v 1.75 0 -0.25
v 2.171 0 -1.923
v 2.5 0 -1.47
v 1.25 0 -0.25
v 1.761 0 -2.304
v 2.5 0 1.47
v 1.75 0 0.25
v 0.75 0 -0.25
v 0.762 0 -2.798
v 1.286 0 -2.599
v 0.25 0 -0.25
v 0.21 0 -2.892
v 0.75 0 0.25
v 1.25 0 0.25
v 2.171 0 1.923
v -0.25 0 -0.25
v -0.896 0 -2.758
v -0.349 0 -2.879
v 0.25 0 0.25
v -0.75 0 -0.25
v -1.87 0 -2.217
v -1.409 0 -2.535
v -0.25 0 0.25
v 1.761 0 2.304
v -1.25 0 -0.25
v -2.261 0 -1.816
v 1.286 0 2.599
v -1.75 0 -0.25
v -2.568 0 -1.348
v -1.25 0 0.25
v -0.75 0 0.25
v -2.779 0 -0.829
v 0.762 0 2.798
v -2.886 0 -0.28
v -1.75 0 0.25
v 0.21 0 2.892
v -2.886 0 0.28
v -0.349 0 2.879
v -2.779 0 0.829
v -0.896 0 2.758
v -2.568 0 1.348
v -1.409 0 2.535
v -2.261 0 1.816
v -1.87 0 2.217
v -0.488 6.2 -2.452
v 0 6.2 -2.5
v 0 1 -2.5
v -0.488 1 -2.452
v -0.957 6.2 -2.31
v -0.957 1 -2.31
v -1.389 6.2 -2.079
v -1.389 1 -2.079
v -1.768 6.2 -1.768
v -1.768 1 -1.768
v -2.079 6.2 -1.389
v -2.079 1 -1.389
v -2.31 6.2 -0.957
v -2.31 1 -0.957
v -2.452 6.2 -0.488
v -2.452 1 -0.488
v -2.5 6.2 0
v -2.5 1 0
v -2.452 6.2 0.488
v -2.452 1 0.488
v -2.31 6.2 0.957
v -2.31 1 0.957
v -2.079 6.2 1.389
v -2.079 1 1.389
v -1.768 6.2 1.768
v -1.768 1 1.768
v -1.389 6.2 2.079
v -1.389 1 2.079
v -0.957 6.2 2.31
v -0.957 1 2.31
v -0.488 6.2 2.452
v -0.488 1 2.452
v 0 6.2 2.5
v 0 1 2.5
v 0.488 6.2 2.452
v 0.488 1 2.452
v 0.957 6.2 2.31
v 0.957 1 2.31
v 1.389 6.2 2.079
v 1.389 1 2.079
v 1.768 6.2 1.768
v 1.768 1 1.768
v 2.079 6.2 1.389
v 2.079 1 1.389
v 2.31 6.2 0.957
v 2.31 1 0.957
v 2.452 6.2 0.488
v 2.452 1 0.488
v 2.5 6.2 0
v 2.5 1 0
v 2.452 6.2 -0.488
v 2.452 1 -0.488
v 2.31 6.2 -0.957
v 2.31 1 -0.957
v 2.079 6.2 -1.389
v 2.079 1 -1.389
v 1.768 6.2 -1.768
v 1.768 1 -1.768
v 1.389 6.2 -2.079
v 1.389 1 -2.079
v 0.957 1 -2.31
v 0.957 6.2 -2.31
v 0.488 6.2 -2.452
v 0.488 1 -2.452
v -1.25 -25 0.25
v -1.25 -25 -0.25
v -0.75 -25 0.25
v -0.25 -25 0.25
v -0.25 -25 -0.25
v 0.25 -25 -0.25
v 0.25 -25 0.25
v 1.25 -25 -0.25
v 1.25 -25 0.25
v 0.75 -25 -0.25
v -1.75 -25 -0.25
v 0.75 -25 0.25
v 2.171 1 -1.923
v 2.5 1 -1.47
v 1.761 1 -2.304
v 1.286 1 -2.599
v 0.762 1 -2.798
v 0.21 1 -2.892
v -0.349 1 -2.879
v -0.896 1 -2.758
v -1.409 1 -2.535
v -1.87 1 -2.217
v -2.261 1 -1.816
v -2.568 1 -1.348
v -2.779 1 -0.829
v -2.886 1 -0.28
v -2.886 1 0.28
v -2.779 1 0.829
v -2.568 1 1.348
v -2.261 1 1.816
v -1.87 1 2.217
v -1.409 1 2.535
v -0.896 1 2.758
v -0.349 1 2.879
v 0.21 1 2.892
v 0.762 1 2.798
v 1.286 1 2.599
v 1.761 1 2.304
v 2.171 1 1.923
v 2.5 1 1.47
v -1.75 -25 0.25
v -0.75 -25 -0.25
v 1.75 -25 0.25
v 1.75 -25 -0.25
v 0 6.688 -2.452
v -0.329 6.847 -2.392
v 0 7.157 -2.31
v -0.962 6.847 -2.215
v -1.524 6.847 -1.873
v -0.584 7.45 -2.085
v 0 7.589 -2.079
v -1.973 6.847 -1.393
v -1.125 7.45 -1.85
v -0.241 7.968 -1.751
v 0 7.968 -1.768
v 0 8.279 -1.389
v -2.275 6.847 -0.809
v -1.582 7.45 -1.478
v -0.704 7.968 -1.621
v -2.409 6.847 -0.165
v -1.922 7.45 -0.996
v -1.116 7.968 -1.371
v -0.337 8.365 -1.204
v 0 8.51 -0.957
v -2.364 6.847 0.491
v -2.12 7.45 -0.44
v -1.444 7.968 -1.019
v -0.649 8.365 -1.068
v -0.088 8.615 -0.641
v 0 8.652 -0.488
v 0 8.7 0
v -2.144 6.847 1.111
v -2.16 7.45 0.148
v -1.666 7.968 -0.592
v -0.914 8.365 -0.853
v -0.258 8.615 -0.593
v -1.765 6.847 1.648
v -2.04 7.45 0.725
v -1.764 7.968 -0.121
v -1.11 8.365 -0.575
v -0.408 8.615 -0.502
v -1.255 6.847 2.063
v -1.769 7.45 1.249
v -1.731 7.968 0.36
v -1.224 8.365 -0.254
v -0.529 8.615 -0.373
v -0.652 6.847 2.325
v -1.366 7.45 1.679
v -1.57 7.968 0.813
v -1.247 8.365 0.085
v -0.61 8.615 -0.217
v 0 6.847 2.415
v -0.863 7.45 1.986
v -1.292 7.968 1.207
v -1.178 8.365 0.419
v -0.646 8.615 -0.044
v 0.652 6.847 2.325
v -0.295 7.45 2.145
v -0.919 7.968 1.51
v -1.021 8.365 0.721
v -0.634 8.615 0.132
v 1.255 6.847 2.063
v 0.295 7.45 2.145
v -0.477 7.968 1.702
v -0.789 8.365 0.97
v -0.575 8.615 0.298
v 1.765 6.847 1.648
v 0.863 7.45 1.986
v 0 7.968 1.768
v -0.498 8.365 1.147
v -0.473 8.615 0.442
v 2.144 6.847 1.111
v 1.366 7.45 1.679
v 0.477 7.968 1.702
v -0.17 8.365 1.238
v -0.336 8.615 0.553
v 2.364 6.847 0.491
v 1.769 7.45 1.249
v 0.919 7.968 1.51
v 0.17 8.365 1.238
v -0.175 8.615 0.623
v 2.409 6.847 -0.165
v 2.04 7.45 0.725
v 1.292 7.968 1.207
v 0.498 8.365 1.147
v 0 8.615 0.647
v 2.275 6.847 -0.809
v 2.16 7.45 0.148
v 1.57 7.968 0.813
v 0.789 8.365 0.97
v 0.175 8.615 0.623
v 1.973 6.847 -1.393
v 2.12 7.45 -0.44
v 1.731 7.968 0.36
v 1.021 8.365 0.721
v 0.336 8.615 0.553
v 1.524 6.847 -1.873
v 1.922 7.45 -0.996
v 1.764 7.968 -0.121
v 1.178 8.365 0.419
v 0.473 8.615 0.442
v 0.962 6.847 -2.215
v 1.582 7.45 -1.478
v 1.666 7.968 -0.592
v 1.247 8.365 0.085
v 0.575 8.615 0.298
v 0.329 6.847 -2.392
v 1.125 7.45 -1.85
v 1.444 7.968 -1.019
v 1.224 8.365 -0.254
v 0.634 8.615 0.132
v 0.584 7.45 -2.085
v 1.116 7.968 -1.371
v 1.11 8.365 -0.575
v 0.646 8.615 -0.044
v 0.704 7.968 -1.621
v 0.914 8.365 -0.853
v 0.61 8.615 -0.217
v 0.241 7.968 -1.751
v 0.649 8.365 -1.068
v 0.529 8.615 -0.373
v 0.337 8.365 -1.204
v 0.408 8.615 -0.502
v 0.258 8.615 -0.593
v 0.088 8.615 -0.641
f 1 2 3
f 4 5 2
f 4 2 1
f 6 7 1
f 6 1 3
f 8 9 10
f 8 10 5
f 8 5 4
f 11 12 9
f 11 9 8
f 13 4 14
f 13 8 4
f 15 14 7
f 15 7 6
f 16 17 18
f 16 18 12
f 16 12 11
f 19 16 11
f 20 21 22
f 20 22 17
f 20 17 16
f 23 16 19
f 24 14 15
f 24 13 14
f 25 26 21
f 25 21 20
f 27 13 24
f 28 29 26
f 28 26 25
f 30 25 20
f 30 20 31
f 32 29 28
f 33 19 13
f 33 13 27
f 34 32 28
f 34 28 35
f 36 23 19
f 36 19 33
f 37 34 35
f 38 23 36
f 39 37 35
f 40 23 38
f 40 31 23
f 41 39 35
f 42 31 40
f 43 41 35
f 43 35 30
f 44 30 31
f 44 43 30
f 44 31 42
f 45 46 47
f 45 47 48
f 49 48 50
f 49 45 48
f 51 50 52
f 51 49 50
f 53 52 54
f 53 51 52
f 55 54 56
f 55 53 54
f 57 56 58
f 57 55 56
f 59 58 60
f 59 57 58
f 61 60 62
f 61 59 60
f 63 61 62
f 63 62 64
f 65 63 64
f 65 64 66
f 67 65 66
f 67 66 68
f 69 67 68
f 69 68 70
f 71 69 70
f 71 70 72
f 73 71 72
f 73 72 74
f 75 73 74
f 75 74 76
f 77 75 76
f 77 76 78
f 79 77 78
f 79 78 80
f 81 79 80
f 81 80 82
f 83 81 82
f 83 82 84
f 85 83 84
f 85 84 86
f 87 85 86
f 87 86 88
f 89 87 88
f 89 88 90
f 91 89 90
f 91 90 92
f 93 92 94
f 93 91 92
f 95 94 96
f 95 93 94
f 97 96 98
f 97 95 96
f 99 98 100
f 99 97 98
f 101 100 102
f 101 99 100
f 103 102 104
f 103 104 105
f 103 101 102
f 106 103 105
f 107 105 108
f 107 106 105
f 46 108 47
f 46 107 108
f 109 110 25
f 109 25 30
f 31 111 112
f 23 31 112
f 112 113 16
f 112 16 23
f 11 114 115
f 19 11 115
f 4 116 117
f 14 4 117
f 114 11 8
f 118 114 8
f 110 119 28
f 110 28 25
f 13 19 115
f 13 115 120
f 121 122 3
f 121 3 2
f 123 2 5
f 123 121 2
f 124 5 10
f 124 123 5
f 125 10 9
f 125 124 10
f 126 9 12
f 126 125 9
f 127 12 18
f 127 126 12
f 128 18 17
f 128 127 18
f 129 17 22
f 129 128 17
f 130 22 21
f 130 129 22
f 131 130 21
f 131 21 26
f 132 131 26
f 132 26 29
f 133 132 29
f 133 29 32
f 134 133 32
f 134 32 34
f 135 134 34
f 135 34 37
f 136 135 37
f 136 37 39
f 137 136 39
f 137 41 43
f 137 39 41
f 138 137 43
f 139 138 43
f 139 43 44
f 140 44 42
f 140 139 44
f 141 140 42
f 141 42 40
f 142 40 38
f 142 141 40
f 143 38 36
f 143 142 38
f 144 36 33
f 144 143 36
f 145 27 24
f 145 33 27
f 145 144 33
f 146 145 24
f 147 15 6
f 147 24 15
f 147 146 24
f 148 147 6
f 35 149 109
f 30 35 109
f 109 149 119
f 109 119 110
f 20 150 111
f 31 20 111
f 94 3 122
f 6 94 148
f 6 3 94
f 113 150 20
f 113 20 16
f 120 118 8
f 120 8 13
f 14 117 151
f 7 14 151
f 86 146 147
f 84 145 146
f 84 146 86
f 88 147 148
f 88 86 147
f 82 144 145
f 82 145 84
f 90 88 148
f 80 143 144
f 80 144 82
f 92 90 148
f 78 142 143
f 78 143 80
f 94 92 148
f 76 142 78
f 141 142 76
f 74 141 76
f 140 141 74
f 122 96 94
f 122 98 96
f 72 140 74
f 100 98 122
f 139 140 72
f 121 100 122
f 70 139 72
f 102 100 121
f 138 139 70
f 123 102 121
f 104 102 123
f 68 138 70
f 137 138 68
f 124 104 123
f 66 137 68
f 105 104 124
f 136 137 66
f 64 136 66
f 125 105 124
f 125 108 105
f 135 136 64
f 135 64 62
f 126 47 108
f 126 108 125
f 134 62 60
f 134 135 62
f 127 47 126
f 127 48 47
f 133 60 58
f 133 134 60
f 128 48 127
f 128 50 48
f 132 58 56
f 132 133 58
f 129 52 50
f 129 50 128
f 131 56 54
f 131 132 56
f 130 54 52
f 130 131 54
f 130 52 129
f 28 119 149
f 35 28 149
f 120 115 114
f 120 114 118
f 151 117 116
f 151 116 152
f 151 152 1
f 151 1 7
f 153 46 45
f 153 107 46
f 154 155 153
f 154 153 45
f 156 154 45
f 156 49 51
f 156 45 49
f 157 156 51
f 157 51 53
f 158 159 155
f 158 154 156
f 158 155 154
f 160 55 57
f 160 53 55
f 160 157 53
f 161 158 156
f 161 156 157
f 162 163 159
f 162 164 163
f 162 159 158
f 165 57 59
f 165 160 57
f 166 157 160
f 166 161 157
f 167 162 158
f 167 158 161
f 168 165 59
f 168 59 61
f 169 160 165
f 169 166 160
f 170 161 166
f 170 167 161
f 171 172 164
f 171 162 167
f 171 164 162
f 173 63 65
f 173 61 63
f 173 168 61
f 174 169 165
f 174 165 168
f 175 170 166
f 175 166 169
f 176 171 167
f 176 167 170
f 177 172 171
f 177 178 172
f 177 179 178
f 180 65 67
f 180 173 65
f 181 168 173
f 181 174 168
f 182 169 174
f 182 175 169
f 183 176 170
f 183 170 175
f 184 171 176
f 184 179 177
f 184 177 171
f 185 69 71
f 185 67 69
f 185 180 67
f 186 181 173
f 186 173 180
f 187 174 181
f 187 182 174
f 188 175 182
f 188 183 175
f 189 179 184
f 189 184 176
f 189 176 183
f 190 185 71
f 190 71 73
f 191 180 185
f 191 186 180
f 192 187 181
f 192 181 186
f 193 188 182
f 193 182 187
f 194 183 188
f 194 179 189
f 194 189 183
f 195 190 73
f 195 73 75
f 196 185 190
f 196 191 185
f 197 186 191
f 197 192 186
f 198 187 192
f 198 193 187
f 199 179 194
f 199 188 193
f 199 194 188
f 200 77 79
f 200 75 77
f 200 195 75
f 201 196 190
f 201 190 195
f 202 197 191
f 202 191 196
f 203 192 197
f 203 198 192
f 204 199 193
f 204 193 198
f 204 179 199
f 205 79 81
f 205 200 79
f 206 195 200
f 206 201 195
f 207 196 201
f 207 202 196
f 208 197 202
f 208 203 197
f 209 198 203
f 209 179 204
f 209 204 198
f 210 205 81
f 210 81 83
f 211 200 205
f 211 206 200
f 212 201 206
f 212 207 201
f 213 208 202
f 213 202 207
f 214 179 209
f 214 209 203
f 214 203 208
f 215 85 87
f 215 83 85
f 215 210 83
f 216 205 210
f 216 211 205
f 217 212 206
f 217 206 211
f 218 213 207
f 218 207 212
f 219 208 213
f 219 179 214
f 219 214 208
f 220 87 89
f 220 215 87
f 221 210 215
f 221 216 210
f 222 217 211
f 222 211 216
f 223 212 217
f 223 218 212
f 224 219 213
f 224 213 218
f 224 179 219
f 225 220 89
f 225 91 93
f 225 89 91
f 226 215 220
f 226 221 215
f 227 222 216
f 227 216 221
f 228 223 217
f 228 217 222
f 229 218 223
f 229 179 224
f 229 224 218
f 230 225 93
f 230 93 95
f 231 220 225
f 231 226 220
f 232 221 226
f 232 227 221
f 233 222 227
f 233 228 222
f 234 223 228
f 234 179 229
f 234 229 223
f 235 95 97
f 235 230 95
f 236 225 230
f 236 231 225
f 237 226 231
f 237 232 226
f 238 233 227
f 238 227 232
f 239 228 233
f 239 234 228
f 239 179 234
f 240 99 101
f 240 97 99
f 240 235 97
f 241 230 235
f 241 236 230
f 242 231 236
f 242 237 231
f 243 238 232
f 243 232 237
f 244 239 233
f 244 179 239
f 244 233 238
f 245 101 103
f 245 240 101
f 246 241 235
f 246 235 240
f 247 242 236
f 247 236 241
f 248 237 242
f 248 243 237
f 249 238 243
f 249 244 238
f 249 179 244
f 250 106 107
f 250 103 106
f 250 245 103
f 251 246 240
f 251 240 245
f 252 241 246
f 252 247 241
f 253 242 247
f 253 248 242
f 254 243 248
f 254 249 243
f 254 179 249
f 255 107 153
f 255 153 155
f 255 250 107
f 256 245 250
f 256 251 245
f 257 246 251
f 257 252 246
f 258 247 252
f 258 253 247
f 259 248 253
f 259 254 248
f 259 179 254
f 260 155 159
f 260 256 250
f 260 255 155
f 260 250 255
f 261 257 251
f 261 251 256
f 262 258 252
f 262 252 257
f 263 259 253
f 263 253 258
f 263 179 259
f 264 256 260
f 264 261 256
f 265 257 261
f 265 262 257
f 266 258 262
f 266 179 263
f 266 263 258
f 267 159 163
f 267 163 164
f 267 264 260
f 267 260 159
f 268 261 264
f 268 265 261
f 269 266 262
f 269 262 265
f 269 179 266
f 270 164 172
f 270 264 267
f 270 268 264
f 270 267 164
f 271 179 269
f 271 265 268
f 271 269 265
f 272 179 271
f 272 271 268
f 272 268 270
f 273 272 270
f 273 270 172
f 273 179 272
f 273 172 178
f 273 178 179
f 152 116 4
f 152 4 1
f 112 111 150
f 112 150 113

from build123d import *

# Parameters (mm, degrees)
CUT_EXTRUDE1_DEPTH      = 10.618211892
CUT_EXTRUDE1_DEPTH_BACK = 10.618211892
SKETCH3_W               = 0.5
SKETCH3_H               = 0.500000016
BOSS_EXTRUDE2_DEPTH     = 25


with BuildPart() as part:
    # Sketch1 → Revolve1 (revolve)
    with BuildSketch(Plane.XY, mode=Mode.PRIVATE) as revolve1_sk:
        with BuildLine():
            Line((0, 0), (2.9, 0))
            Line((2.9, 0), (2.9, 1))
            Line((2.9, 1), (2.5, 1))
            Line((2.5, 1), (2.5, 6.2))
            ThreePointArc((2.5, 6.2), (1.767766953, 7.967766953), (0, 8.7))
            Line((0, 8.7), (0, 0))
        make_face()
    revolve(revolve1_sk.sketch.rotate(Axis((0, 0, 0), (0, 1, 0)), 90), axis=Axis((0, 0, 0), (0, 1, 0)))

    # Sketch2 → Cut-Extrude1 (cut, two sides: drawn at the far end of the back side and taken through both)
    with BuildSketch(Plane(origin=(0, 0, 0), x_dir=(1, 0, 0), z_dir=(0, 1, 0)).offset(-CUT_EXTRUDE1_DEPTH_BACK)):
        Polygon((2.5, 0), (2.5, 2.5), (3.317010746, 2.5), (3.317010746, -2.186016692), (2.5, -2.186016692), align=None)
    extrude(amount=CUT_EXTRUDE1_DEPTH + CUT_EXTRUDE1_DEPTH_BACK, mode=Mode.SUBTRACT)

    # Sketch3 → Boss-Extrude2 (add)
    with BuildSketch(Plane.XZ):
        with Locations((-1.5, 0)):
            Rectangle(SKETCH3_W, SKETCH3_H)
        with Locations((-0.5, 0)):
            Rectangle(SKETCH3_W, SKETCH3_H)
        with Locations((0.5, 0)):
            Rectangle(SKETCH3_W, SKETCH3_H)
        with Locations((1.5, 0)):
            Rectangle(SKETCH3_W, SKETCH3_H)
    extrude(amount=BOSS_EXTRUDE2_DEPTH)


solid = part.part
